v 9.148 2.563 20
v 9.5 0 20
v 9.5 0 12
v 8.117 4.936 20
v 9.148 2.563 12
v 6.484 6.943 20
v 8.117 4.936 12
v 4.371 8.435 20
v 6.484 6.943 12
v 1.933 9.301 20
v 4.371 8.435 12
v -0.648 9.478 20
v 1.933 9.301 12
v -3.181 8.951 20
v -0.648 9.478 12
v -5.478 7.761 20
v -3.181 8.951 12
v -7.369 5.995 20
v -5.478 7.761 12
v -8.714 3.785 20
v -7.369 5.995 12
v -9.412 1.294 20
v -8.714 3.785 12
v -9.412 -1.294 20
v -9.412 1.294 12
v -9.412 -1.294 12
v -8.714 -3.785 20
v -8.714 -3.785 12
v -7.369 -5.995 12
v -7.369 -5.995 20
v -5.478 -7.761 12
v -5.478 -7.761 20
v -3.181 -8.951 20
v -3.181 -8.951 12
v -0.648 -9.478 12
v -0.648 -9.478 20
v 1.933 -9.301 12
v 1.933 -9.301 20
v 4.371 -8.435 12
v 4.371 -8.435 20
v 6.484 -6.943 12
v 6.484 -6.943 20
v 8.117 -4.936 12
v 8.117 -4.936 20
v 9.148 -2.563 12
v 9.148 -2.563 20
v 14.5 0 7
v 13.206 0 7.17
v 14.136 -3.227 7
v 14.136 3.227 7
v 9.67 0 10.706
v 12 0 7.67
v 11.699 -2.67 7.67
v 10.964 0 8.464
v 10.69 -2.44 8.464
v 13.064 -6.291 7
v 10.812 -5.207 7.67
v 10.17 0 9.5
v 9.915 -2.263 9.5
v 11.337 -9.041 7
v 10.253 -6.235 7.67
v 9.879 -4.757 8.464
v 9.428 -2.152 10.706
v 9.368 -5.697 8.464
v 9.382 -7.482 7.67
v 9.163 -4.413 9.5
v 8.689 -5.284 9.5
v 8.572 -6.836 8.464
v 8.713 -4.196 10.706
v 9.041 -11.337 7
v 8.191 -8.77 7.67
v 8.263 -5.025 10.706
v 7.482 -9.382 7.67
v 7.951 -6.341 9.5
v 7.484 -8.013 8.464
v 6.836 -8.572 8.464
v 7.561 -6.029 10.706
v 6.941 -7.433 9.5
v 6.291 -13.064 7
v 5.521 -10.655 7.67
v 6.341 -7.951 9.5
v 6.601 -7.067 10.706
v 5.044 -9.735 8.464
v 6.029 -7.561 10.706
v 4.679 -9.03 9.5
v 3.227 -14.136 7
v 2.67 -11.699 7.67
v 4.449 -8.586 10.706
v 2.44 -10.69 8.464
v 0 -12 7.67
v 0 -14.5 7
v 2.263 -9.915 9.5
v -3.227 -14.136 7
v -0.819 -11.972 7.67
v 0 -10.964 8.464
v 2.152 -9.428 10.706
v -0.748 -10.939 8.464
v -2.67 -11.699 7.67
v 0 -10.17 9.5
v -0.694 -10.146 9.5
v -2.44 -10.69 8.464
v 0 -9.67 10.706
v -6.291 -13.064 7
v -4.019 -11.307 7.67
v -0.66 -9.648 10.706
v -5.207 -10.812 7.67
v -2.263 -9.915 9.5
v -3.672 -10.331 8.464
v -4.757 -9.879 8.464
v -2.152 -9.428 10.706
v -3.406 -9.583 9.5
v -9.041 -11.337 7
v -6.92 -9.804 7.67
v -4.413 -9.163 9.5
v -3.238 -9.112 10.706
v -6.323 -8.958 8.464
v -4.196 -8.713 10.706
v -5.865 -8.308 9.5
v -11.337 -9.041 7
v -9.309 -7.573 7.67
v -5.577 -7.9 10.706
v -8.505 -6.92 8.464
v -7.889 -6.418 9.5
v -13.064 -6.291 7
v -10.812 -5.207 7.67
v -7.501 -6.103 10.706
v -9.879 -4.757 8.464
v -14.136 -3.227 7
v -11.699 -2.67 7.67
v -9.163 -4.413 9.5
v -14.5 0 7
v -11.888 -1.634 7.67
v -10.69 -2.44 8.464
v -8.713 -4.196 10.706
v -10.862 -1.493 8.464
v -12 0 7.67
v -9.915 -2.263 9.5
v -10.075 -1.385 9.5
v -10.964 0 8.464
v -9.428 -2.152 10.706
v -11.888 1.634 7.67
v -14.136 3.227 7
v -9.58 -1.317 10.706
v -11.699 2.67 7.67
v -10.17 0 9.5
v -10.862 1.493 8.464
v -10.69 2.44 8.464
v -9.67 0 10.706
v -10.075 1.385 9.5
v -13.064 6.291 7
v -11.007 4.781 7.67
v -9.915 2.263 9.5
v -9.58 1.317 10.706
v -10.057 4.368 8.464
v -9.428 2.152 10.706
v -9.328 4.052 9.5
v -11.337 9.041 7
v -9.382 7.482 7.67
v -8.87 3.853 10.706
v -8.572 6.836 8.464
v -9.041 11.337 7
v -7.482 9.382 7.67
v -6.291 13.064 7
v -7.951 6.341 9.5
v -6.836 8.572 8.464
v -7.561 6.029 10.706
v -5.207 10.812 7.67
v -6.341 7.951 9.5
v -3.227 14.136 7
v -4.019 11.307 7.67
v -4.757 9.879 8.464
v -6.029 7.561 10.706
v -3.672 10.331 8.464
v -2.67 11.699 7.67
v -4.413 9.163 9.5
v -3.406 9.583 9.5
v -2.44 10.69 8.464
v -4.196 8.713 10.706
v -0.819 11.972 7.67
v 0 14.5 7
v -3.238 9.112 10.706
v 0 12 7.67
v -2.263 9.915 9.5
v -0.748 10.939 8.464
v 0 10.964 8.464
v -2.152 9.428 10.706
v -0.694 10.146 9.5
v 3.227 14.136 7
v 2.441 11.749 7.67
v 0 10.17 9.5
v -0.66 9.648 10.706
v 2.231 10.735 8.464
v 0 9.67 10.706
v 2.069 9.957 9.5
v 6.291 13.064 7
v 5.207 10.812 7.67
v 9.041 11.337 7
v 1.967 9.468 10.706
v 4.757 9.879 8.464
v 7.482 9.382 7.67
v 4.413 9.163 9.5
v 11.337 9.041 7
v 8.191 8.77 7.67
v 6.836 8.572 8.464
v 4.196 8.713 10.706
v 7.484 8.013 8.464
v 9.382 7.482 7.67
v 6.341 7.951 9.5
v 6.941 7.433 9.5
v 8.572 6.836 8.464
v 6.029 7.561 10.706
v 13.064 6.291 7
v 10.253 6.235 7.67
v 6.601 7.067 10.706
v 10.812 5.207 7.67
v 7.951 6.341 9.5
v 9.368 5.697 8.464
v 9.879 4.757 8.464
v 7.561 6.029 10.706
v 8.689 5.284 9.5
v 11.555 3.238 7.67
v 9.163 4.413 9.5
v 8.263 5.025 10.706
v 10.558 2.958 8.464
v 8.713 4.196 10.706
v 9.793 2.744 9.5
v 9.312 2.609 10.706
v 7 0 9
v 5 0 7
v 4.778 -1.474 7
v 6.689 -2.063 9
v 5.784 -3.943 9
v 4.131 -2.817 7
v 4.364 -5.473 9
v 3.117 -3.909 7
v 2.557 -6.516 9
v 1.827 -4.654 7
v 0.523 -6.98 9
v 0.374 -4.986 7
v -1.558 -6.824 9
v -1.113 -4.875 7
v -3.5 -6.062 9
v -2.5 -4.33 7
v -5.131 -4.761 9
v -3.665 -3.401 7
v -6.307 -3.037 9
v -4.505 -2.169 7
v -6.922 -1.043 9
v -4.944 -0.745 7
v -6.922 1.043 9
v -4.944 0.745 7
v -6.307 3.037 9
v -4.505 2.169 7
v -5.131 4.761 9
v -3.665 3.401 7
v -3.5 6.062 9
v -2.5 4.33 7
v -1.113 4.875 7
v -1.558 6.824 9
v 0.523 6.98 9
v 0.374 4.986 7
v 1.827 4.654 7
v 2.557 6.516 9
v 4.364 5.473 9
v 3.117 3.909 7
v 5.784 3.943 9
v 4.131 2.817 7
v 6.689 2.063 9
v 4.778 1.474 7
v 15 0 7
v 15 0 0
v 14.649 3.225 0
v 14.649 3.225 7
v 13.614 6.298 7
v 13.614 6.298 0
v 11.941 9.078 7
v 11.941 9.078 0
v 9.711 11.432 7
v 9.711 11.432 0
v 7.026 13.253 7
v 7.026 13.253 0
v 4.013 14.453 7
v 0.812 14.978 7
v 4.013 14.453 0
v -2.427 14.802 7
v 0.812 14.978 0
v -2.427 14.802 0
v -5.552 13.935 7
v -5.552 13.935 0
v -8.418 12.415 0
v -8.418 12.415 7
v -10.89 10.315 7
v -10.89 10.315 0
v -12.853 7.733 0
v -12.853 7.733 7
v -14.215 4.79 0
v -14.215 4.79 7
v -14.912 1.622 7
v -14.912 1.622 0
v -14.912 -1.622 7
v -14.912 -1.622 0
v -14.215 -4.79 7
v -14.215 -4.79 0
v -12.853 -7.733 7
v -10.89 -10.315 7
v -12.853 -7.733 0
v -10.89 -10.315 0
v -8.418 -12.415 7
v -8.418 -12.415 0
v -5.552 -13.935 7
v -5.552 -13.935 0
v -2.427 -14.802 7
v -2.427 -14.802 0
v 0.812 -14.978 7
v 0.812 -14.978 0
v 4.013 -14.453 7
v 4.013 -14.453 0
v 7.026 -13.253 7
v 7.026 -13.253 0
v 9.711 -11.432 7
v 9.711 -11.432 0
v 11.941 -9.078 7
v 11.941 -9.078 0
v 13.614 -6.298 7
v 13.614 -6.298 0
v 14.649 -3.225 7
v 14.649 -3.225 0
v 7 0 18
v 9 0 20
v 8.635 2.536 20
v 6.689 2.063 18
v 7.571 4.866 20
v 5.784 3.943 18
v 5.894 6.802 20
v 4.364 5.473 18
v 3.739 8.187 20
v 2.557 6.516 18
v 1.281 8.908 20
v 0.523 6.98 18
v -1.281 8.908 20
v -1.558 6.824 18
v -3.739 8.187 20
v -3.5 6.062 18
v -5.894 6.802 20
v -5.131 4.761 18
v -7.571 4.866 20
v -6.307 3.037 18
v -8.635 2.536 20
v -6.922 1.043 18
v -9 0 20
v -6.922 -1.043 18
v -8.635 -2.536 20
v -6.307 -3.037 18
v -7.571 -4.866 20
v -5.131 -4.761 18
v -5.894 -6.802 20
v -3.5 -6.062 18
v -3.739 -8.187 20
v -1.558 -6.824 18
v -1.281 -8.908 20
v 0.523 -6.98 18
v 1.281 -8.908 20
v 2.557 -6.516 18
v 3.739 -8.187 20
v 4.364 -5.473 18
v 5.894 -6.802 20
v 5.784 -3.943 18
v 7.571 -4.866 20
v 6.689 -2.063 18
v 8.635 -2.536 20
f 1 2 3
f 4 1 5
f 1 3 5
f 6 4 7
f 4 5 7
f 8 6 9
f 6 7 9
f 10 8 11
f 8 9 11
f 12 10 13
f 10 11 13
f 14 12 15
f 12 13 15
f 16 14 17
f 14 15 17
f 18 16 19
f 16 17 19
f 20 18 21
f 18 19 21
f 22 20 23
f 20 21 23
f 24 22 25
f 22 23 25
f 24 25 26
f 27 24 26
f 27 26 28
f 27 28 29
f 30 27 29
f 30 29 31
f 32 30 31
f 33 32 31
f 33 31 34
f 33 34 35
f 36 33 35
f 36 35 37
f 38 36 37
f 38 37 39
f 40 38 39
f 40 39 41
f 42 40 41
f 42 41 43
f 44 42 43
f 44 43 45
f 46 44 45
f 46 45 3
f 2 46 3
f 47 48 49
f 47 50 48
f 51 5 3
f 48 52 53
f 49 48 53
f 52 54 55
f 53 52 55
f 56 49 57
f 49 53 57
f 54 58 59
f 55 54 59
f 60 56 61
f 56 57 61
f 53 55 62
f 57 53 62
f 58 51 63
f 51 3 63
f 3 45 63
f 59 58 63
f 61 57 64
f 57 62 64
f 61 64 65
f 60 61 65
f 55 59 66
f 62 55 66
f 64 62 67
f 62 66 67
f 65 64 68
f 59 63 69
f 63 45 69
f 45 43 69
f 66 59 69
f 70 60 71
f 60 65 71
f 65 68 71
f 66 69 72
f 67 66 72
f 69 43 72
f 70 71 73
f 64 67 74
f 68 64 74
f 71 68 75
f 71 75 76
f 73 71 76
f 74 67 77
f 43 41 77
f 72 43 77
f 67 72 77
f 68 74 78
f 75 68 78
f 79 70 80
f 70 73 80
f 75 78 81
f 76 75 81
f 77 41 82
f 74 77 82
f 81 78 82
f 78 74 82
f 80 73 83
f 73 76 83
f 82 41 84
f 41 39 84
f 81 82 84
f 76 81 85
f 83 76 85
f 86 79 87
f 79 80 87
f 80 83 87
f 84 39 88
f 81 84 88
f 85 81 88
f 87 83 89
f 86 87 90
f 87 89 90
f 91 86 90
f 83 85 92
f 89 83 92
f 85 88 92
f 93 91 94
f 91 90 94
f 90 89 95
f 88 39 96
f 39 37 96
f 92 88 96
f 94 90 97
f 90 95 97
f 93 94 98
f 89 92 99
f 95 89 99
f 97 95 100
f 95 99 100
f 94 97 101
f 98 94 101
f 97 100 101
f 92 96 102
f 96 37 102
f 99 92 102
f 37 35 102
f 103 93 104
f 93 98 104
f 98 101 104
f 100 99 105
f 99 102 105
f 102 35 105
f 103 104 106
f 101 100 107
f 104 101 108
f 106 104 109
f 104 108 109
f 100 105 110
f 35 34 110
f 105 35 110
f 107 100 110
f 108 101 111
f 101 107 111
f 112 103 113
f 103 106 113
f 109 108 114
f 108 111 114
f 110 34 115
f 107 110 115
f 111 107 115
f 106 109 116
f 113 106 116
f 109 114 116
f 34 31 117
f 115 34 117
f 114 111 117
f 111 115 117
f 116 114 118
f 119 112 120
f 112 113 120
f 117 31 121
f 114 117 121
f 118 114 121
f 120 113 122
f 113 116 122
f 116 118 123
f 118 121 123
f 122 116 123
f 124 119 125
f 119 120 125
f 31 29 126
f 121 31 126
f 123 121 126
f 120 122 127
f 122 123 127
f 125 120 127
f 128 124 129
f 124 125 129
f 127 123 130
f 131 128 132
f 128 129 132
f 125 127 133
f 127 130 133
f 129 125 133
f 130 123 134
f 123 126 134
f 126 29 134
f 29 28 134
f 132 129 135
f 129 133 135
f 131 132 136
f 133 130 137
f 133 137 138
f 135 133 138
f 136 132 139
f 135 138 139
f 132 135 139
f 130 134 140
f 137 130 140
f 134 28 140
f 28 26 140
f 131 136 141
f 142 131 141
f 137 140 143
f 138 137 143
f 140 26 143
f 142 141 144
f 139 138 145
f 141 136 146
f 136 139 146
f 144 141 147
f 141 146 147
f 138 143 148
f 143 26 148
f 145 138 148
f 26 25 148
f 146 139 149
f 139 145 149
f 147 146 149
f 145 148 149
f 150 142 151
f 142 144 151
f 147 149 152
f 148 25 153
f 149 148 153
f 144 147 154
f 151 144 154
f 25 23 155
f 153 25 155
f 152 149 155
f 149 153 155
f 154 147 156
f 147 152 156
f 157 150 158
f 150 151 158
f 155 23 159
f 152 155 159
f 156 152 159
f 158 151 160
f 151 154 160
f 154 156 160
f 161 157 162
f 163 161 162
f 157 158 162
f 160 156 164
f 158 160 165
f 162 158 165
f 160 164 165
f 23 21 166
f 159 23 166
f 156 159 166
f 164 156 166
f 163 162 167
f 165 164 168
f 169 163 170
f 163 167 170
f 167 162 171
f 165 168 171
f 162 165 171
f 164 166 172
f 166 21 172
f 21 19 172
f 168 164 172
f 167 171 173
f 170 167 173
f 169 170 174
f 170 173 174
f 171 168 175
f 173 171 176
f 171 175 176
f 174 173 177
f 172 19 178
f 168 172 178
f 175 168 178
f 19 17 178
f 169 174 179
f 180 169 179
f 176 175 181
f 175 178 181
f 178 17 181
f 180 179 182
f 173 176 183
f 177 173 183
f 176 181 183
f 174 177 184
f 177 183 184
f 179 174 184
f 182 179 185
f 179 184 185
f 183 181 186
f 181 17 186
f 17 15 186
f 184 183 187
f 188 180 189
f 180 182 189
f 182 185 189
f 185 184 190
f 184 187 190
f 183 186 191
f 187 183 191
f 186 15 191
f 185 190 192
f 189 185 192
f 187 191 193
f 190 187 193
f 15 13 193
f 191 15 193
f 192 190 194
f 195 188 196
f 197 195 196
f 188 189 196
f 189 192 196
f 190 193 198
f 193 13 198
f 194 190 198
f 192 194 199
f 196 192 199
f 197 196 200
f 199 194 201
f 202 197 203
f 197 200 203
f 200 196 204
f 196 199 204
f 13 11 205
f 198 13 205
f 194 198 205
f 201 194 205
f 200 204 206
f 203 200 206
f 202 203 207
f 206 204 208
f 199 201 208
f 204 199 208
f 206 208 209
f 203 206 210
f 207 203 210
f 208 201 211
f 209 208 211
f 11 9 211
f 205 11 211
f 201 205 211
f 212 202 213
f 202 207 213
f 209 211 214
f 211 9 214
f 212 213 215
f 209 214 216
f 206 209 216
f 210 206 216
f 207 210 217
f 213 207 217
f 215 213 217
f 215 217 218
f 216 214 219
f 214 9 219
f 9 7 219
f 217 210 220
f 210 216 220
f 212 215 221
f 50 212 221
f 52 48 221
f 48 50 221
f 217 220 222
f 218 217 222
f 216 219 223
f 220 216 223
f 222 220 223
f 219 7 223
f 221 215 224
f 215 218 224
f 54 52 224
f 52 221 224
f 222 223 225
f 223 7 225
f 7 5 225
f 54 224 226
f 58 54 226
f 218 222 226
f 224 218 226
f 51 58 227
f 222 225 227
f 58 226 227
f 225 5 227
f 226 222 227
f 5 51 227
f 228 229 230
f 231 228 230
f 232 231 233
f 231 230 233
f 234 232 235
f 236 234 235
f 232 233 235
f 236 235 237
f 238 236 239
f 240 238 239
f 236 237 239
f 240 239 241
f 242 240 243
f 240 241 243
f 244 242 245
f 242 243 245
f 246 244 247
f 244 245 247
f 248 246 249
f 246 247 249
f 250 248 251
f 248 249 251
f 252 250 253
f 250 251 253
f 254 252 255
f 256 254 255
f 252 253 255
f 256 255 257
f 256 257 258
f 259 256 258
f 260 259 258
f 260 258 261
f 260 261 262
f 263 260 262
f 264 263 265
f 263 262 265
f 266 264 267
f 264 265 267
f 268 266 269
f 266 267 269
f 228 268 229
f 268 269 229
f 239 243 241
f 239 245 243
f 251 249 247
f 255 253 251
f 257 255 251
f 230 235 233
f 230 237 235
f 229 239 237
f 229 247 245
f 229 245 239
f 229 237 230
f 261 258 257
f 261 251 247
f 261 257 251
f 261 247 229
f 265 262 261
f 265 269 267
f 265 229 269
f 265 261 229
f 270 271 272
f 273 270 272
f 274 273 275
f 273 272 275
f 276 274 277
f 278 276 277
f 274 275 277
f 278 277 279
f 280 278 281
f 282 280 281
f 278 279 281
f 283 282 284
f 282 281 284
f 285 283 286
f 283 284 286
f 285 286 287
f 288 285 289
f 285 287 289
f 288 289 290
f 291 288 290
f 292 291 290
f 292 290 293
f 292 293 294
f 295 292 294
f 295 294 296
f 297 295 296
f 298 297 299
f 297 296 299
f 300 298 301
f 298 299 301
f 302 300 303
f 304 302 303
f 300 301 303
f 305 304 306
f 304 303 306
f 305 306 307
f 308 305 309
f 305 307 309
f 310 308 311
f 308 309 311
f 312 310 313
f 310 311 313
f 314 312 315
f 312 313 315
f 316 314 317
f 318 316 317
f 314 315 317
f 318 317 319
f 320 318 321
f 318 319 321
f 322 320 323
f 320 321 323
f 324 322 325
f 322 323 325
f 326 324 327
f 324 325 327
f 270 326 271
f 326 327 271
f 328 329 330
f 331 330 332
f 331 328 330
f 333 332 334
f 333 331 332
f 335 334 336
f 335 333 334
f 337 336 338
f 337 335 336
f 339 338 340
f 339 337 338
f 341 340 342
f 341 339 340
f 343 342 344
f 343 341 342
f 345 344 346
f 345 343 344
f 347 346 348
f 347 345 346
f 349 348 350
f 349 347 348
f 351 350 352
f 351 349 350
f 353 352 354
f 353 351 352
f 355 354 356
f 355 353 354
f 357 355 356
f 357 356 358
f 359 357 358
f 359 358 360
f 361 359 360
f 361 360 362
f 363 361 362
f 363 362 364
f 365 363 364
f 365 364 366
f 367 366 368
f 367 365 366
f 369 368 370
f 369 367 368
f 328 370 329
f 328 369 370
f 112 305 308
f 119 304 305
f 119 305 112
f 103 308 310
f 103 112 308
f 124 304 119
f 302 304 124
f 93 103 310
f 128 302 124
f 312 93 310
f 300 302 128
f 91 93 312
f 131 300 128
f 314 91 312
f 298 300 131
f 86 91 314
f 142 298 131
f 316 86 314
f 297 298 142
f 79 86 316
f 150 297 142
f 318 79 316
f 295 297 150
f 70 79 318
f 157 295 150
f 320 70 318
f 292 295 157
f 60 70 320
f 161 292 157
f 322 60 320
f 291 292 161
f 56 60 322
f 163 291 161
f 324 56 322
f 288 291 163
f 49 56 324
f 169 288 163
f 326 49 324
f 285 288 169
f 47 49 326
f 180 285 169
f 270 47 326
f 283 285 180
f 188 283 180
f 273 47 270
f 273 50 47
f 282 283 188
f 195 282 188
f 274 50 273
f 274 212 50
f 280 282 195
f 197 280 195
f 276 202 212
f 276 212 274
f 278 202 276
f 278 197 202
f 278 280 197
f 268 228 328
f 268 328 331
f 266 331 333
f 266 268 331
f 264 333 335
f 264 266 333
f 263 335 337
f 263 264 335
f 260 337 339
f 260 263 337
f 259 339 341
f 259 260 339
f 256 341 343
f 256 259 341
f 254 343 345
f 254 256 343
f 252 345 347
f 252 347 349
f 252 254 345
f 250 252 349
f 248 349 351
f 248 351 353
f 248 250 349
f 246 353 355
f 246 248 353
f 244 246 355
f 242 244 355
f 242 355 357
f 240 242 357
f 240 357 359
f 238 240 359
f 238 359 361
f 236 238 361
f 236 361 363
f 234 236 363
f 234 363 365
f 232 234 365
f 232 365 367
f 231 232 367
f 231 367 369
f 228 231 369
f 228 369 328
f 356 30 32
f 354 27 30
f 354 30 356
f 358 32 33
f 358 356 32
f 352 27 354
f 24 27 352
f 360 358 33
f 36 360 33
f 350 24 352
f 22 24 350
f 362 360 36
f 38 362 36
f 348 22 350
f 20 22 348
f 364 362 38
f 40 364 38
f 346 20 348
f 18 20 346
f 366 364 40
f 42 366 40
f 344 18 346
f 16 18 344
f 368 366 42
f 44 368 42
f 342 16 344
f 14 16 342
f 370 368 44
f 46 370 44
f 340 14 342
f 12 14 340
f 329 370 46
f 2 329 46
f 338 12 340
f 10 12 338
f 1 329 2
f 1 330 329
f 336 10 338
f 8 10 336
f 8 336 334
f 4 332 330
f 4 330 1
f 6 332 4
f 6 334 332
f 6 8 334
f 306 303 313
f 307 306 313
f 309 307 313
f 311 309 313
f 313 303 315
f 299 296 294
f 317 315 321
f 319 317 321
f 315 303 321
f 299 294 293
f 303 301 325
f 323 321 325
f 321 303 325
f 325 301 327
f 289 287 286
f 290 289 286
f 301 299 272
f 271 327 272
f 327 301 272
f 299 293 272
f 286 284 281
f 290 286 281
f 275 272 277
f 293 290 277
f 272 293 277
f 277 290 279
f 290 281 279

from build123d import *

# Parameters (mm, degrees)
F0_R     = 15
F0_R_2   = 9.5
F0_R_3   = 7
F1_DEPTH = 7
F2_DEPTH = 20
F3_R     = 5
F4_SIZE  = 2
F5_SIZE  = 2


with BuildPart() as f1:
    # F0 (on Top) → F1 (new body)
    with BuildSketch(Plane.XY):
        Circle(F0_R)
        Circle(F0_R_2, mode=Mode.SUBTRACT)
        Circle(F0_R_2)
        Circle(F0_R_3, mode=Mode.SUBTRACT)
        Circle(F0_R_3)
    extrude(amount=F1_DEPTH)

    # F0 (on Top) → F2 (join)
    with BuildSketch(Plane.XY):
        Circle(F0_R_2)
        Circle(F0_R_3, mode=Mode.SUBTRACT)
    extrude(amount=F2_DEPTH)

    # F3
    f3_edges = [f1.edges().sort_by_distance(p)[0] for p in [
        (-9.5, 0, 7),
    ]]
    fillet(f3_edges, radius=F3_R)

    # F4
    f4_edges = [f1.edges().sort_by_distance(p)[0] for p in [
        (-7, 0, 20),
    ]]
    chamfer(f4_edges, length=F4_SIZE)

    # F5
    f5_edges = [f1.edges().sort_by_distance(p)[0] for p in [
        (-7, 0, 7),
    ]]
    chamfer(f5_edges, length=F5_SIZE)


solid = f1.part
